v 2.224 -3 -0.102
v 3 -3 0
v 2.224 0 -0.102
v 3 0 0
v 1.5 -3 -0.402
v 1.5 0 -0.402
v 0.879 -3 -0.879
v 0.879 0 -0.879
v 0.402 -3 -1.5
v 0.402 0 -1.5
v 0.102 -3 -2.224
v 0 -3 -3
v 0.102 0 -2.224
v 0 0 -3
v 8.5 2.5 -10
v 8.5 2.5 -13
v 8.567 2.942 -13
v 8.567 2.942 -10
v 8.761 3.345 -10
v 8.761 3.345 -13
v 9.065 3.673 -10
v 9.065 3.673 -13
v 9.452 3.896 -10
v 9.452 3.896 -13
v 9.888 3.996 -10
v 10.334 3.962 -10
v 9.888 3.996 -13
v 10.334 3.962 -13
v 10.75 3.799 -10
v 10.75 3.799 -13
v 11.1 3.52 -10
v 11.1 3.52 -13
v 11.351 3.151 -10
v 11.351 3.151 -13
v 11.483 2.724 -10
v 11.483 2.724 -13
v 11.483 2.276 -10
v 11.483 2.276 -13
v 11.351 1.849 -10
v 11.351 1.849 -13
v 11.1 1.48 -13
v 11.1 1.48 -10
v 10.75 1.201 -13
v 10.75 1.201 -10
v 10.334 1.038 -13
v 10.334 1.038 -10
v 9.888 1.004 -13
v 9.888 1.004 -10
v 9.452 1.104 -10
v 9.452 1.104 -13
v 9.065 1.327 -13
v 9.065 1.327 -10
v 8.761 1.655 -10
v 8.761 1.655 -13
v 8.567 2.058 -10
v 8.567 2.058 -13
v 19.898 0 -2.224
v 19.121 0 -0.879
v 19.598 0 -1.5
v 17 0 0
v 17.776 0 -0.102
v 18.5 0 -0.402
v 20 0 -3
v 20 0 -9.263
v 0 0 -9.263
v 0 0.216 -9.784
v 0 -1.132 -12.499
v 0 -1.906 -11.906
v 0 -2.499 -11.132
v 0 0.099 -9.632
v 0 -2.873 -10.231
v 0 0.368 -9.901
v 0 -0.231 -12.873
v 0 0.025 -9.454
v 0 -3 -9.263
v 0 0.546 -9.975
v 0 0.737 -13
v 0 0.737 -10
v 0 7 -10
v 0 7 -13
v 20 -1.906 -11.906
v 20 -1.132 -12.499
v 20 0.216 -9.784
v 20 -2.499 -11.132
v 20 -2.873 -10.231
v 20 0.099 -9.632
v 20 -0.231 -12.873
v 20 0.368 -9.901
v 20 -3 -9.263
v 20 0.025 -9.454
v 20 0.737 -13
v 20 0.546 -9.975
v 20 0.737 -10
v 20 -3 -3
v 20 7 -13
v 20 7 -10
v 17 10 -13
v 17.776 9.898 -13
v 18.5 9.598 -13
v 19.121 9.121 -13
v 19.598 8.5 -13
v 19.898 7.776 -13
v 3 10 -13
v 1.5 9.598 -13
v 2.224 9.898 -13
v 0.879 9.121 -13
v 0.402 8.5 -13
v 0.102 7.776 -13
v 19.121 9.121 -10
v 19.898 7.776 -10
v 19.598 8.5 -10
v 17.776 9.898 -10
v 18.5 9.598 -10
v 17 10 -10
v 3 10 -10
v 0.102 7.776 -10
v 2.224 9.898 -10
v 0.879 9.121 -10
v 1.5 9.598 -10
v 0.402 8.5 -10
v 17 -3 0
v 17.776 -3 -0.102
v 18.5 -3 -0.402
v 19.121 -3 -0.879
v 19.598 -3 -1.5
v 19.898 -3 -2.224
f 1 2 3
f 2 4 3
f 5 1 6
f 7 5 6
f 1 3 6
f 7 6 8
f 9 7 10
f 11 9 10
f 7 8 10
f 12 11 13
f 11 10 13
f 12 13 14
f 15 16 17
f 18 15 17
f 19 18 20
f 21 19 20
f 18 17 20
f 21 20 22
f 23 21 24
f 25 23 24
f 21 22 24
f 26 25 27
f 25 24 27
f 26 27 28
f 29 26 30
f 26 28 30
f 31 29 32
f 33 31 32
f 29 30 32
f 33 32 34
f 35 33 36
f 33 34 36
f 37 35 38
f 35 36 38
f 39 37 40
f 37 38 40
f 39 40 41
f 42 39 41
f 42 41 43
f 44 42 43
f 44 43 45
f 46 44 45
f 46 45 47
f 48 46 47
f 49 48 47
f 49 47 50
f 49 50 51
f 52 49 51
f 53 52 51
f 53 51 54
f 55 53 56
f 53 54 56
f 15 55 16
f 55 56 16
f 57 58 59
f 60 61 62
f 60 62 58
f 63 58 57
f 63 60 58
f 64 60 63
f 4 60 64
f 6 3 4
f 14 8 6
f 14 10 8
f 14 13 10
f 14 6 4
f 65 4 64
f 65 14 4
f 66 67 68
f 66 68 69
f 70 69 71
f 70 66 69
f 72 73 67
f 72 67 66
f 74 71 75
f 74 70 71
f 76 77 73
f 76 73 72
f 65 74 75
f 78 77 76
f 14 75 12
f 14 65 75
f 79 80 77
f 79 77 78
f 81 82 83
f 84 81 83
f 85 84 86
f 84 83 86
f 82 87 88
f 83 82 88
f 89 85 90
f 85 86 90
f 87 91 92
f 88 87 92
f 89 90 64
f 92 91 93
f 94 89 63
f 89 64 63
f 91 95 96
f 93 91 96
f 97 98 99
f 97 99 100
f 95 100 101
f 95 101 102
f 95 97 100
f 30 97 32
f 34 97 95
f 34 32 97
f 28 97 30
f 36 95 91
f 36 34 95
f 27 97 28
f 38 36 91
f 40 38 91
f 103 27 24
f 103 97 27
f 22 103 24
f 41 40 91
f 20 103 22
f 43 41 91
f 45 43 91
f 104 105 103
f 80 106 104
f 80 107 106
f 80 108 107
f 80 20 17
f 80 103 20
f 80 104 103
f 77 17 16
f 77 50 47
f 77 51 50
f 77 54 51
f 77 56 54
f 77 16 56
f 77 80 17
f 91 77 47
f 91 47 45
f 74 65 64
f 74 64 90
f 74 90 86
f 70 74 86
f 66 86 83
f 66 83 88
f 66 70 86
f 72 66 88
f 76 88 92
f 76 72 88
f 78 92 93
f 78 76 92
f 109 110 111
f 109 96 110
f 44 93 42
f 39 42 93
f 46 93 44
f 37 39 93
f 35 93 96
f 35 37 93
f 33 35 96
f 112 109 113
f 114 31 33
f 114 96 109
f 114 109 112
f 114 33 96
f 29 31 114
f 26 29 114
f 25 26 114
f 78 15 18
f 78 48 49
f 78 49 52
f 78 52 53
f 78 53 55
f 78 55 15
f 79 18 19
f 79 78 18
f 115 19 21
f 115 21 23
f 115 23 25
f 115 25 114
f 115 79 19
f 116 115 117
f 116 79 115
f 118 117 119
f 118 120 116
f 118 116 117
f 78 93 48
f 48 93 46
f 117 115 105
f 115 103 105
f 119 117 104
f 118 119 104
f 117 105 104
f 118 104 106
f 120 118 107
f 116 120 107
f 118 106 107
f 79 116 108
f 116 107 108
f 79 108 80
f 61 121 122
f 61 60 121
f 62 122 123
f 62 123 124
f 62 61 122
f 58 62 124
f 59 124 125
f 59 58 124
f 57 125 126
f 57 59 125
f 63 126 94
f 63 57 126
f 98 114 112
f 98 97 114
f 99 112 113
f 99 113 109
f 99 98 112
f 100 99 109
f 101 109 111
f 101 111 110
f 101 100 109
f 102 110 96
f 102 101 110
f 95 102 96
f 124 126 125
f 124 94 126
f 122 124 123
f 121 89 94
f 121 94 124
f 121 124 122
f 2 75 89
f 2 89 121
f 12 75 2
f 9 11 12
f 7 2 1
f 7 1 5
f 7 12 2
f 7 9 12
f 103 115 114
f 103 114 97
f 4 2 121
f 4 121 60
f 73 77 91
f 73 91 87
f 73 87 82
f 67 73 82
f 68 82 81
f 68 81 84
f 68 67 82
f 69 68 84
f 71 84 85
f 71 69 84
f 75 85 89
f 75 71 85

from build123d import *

# Parameters (mm, degrees)
BASE_FLANGE1_DEPTH = 20
FILLET1_R          = 3
SKETCH2_R          = 1.5
CUT_EXTRUDE1_DEPTH = 3


# Sheet-metal steps are written as plain solids
with BuildPart() as part:
    # Sketch1 → Base-Flange1 (new body)
    with BuildSketch(Plane(origin=(0, 0, 0), x_dir=(0, 0, -1), z_dir=(1, 0, 0))):
        with BuildLine():
            Line((0, 0), (9.2634, 0))
            ThreePointArc((9.2634, 0), (9.784254855, 0.215745145), (10, 0.7366))
            Line((10, 0.7366), (10, 10))
            Line((10, 10), (13, 10))
            Line((13, 10), (13, 0.7366))
            ThreePointArc((13, 0.7366), (11.905575199, -1.905575199), (9.2634, -3))
            Line((9.2634, -3), (0, -3))
            Line((0, -3), (0, 0))
        make_face()
    extrude(amount=BASE_FLANGE1_DEPTH)

    # Fillet1
    fillet1_edges = [part.edges().sort_by_distance(p)[0] for p in [
        (20, -1.5, 0),
        (20, 10, -11.5),
        (0, -1.5, 0),
        (0, 10, -11.5),
    ]]
    fillet(fillet1_edges, radius=FILLET1_R)

    # Sketch2 → Cut-Extrude1 (cut)
    with BuildSketch(Plane(origin=(0, 0, -13), x_dir=(-1, 0, 0), z_dir=(0, 0, -1))):
        with Locations((-10, 2.5)):
            Circle(SKETCH2_R)
    extrude(amount=-CUT_EXTRUDE1_DEPTH, mode=Mode.SUBTRACT)


solid = part.part
